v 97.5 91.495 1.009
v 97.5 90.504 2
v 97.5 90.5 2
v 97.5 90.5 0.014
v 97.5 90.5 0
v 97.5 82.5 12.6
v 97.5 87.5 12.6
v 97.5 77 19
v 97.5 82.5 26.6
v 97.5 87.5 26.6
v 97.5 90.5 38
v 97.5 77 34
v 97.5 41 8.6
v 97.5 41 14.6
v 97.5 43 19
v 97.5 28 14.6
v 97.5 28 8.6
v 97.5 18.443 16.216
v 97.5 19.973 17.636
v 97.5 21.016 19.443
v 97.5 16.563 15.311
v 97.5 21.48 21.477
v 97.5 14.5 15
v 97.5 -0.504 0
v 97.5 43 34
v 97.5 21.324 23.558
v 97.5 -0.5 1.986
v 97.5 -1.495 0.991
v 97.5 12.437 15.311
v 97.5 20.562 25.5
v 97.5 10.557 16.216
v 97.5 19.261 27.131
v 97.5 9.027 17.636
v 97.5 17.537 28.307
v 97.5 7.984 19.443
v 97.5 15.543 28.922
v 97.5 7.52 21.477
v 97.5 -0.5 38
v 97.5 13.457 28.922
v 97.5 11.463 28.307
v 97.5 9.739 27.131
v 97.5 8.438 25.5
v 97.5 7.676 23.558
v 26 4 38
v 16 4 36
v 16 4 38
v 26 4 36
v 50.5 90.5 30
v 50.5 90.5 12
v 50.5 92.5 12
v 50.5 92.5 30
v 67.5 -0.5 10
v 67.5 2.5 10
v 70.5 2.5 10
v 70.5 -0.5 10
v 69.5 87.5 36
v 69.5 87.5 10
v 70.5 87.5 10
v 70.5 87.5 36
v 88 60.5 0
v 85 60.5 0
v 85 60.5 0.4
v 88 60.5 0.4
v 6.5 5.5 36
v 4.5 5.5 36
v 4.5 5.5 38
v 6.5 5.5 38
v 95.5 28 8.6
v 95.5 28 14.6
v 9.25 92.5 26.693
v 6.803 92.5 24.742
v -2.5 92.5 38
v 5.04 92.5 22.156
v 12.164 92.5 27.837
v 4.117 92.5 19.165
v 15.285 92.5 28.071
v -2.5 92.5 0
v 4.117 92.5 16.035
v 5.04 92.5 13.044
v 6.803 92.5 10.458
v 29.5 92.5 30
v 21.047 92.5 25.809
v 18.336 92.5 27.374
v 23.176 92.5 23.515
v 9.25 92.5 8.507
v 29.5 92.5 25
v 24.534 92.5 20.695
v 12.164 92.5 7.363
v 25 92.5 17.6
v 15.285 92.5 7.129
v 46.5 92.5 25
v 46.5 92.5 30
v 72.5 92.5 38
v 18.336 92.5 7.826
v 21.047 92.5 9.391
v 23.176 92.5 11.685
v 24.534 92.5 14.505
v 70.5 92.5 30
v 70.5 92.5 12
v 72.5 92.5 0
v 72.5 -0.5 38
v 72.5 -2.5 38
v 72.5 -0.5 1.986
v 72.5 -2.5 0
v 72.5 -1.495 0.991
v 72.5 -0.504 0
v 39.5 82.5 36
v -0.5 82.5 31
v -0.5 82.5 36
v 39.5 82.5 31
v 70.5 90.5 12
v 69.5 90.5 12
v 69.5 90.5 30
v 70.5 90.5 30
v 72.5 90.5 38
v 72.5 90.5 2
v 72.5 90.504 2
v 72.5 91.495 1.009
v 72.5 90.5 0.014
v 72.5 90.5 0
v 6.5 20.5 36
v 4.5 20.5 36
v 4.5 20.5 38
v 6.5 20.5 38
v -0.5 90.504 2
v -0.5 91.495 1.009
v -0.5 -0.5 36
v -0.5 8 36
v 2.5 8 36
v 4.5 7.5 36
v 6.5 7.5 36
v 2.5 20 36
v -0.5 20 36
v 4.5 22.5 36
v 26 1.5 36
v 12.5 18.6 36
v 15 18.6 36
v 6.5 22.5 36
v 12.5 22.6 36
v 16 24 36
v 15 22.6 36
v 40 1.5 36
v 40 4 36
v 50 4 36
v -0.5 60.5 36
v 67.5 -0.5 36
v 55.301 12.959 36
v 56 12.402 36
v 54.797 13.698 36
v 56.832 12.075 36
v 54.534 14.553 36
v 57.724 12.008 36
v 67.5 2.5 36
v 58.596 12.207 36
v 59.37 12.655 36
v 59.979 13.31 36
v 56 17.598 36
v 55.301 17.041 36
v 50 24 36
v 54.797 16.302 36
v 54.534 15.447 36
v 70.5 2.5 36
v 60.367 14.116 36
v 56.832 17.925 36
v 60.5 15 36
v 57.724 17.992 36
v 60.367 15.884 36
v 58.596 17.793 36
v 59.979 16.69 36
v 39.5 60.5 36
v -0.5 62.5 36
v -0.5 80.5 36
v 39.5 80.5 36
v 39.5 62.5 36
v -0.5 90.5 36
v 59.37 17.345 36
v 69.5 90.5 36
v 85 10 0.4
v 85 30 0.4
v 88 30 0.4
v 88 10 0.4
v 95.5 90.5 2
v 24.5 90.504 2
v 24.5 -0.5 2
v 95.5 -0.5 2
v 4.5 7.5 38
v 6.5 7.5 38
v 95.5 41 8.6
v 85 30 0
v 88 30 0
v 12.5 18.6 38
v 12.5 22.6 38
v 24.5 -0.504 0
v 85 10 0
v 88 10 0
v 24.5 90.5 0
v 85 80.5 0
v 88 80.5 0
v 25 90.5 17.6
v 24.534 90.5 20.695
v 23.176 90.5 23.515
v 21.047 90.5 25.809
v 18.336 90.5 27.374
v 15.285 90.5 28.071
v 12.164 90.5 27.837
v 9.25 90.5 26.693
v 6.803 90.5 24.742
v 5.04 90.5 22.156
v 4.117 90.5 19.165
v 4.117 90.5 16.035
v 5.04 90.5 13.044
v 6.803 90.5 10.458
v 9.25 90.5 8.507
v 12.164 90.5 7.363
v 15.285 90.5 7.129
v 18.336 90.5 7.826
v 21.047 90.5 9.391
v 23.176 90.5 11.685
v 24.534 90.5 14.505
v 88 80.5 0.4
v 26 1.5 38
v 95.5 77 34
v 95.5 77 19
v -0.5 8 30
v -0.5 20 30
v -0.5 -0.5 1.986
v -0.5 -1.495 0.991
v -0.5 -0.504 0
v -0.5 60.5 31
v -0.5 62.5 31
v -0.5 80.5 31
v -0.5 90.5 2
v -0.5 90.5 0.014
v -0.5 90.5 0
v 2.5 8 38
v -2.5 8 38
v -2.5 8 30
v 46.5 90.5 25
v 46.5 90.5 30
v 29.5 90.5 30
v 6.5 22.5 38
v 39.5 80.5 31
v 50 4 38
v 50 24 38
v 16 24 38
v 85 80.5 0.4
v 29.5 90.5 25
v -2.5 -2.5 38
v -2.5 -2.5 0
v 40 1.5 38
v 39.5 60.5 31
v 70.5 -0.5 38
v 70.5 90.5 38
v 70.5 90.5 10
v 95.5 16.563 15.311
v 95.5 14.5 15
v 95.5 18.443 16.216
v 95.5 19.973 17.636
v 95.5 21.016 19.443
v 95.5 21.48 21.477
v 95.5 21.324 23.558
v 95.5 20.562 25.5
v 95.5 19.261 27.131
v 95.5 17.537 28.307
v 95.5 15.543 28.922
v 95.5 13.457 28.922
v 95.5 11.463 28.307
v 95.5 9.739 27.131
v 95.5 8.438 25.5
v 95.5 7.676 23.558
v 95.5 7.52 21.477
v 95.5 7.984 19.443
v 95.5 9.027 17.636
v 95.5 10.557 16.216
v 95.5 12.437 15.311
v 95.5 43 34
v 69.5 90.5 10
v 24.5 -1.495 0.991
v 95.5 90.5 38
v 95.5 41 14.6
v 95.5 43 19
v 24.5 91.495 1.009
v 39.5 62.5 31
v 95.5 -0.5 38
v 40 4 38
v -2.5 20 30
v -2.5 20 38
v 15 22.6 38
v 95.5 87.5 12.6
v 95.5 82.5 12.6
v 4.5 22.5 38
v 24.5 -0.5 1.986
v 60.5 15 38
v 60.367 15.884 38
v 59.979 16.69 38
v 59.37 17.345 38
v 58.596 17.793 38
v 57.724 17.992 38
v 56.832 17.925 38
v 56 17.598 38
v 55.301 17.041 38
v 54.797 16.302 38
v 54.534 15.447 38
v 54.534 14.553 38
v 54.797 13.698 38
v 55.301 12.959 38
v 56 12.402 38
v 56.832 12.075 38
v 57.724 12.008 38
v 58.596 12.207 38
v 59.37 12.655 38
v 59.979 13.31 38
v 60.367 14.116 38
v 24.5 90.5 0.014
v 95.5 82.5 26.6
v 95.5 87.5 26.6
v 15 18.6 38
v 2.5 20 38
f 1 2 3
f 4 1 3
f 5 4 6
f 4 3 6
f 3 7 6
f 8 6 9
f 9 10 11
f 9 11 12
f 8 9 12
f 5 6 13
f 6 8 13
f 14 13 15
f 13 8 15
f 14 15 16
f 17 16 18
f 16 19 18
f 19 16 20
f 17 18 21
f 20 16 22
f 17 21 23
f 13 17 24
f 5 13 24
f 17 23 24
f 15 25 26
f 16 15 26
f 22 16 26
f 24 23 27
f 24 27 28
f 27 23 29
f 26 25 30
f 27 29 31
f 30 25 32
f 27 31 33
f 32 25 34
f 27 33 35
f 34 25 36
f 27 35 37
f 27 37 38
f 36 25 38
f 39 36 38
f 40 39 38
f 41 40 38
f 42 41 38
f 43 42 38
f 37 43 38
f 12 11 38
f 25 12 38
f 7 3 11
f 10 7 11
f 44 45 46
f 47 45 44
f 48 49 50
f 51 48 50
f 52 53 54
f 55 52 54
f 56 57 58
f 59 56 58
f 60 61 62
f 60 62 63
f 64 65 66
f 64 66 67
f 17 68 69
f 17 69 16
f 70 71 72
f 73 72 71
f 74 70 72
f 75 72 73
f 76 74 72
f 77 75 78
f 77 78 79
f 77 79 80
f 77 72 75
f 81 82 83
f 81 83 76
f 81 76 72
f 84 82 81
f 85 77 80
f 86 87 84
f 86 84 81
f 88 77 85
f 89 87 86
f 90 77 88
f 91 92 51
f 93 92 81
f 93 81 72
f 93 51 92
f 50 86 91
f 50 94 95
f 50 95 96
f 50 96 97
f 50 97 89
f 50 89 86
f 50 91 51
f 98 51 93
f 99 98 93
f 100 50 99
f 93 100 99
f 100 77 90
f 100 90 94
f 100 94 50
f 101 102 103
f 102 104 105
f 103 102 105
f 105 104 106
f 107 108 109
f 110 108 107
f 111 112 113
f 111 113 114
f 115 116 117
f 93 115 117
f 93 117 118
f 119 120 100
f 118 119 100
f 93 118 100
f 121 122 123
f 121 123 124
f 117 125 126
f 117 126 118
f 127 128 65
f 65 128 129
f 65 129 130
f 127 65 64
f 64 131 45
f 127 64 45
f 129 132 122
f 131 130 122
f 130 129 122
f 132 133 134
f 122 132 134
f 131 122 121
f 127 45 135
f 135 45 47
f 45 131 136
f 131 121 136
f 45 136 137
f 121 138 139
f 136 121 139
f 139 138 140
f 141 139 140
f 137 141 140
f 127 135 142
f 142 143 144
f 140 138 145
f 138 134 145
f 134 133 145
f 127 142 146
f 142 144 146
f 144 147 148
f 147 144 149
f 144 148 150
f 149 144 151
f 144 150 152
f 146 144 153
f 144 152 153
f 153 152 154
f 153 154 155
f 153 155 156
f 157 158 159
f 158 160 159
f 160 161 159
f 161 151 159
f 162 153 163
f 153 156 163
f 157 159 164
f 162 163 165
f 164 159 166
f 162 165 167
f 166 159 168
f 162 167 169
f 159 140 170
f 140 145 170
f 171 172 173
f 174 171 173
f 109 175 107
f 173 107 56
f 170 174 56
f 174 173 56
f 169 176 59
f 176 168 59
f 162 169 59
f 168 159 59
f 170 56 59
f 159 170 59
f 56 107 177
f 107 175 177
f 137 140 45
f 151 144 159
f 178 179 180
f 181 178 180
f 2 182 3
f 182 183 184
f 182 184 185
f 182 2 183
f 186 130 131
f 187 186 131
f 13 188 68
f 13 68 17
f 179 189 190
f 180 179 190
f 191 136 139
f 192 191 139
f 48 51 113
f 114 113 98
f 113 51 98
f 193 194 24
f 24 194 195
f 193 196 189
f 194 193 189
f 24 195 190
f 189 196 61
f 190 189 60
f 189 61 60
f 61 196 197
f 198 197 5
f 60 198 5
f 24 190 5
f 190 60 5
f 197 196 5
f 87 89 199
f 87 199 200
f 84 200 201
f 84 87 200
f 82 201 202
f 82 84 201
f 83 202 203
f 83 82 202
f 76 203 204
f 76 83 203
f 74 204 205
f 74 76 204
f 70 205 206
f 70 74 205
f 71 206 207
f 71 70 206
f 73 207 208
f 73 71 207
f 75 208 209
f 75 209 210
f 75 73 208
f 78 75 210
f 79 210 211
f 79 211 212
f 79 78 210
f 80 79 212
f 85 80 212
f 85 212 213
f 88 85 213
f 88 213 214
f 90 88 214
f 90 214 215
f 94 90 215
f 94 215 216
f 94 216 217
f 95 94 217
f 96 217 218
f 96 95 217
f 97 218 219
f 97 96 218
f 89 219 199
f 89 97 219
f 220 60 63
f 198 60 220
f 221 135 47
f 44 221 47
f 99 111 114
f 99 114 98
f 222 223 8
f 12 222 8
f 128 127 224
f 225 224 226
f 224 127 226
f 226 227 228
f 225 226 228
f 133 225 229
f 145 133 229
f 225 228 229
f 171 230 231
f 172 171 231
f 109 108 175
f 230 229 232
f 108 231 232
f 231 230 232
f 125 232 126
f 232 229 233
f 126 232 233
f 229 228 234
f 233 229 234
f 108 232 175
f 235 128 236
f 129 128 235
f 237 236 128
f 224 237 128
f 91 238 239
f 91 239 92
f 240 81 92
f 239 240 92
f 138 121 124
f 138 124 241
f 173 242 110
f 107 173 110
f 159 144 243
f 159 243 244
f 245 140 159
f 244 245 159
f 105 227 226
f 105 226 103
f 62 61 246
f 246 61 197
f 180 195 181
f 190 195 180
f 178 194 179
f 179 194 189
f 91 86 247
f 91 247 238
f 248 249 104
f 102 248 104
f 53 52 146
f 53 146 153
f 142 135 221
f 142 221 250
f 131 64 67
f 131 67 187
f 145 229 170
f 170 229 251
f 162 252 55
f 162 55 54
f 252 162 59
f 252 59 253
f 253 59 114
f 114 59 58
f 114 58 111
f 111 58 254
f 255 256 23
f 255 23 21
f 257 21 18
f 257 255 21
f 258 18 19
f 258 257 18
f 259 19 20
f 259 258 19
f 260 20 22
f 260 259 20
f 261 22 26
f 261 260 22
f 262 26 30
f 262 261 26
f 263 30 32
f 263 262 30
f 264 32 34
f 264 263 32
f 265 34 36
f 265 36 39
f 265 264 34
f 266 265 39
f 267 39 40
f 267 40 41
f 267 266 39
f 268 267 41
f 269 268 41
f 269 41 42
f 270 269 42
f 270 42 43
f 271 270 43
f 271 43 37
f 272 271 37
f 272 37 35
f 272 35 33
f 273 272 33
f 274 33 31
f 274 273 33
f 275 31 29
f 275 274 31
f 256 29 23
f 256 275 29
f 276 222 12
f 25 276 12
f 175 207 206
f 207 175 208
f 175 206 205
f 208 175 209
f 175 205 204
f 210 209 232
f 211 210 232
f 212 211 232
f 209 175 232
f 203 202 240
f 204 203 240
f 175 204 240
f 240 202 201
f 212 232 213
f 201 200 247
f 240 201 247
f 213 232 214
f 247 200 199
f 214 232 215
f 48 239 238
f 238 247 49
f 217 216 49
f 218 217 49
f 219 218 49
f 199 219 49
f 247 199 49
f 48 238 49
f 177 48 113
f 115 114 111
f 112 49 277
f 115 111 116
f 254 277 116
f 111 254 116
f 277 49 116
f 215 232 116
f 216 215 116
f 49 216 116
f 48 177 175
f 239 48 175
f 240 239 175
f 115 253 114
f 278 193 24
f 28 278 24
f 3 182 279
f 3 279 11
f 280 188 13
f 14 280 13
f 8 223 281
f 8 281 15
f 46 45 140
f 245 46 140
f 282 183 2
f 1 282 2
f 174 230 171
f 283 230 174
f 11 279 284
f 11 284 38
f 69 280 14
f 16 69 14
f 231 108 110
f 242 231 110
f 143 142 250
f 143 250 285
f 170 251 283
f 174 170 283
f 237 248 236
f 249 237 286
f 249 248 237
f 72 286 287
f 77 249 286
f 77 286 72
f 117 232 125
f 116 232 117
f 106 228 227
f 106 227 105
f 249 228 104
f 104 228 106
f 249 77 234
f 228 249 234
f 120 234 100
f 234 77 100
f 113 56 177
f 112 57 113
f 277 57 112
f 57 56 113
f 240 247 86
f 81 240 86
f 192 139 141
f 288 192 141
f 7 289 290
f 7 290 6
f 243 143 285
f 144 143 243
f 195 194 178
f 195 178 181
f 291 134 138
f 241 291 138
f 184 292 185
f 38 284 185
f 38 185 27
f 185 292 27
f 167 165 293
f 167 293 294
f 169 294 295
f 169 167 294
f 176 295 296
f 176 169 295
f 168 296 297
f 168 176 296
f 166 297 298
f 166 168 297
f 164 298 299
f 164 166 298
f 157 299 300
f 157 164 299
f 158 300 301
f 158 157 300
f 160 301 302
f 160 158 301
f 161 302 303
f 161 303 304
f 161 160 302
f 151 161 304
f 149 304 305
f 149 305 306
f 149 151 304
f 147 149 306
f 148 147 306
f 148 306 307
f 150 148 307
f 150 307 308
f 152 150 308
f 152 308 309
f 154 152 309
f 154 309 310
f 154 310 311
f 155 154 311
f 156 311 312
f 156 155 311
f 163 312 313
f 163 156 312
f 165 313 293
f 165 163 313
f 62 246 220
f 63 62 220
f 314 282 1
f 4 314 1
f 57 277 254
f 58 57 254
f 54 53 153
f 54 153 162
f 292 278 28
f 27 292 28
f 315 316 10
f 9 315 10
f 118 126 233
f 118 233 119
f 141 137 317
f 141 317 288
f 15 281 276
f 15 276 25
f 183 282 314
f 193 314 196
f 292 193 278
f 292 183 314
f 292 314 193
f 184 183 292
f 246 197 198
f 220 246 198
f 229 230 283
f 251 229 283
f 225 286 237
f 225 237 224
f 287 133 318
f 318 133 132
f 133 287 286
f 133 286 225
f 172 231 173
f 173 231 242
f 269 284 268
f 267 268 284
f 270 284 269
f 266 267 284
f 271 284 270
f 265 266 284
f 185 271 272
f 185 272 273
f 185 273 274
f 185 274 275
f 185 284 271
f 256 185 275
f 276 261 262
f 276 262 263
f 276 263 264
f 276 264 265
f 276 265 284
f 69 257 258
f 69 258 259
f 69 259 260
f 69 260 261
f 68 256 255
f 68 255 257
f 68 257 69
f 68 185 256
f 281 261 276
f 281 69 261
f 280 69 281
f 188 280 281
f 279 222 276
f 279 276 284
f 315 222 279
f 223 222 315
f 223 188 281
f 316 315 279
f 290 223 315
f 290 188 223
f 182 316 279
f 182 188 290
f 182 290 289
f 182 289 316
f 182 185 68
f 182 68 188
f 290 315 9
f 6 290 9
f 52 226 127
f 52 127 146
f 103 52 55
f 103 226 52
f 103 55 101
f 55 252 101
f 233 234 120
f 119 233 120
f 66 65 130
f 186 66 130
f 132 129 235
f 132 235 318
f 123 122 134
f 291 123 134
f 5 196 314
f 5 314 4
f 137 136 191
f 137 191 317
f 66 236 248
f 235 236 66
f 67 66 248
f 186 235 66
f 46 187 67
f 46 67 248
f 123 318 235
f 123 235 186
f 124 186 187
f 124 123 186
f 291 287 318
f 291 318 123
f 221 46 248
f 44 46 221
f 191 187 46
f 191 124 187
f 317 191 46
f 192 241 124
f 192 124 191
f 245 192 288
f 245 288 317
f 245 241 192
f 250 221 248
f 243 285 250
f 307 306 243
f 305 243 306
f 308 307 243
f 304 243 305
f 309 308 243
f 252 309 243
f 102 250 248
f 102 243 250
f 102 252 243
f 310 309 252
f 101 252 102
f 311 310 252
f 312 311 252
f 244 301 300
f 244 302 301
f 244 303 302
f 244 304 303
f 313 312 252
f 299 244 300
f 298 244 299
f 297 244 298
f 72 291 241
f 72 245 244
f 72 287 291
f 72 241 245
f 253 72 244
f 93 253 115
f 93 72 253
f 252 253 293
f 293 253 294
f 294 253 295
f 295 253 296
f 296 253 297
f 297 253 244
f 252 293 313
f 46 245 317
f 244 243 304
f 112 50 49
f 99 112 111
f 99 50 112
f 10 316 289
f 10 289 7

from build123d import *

# Parameters (mm, degrees)
BOX020_W               = 73
BOX020_H               = 1
BOX020_DEPTH           = 2
BOX020_PLACEMENT_ANGLE = 45
BOX019_W               = 73
BOX019_H               = 1
BOX019_DEPTH           = 2
BOX019_PLACEMENT_ANGLE = 45
BOX018_W               = 73
BOX018_H               = 1
BOX018_DEPTH           = 2
CUT012_PLACEMENT_ANGLE = 180
BOX017_W               = 73
BOX017_H               = 91
BOX017_DEPTH           = 2
BOX015_W               = 3
BOX015_H               = 3
BOX015_DEPTH           = 26
BOX013_W               = 40
BOX013_H               = 2
BOX013_DEPTH           = 5
CYLINDER001_R          = 10.5
CYLINDER001_DEPTH      = 2
BOX012_W               = 17
BOX012_H               = 2
BOX012_DEPTH           = 5
BOX011_W               = 20
BOX011_H               = 2
BOX011_DEPTH           = 18
BOX010_W               = 75
BOX010_H               = 2
BOX010_DEPTH           = 38
BOX009_W               = 75
BOX009_H               = 2
BOX009_DEPTH           = 38
BOX008_W               = 2
BOX008_H               = 12
BOX008_DEPTH           = 8
BOX007_W               = 2
BOX007_H               = 91
BOX007_DEPTH           = 38
BOX006_W               = 3
BOX006_H               = 12
BOX006_DEPTH           = 2
BOX005_W               = 2
BOX005_H               = 2
BOX005_DEPTH           = 2
BOX004_W               = 2
BOX004_H               = 2
BOX004_DEPTH           = 2
BOX003_W               = 2.5
BOX003_H               = 4
BOX003_DEPTH           = 2
CYLINDER_R             = 3
CYLINDER_DEPTH         = 2
BOX002_W               = 14
BOX002_H               = 5
BOX002_DEPTH           = 2
BOX001_W               = 34
BOX001_H               = 20
BOX001_DEPTH           = 2
BOX_W                  = 71
BOX_H                  = 91
BOX_DEPTH              = 2
BOX014_W               = 40
BOX014_H               = 2
BOX014_DEPTH           = 5
BOX016_W               = 1
BOX016_H               = 3
BOX016_DEPTH           = 26
BOX026_W               = 2
BOX026_H               = 5
BOX026_DEPTH           = 14
BOX024_W               = 2
BOX024_H               = 13
BOX024_DEPTH           = 6
BOX025_W               = 2
BOX025_H               = 34
BOX025_DEPTH           = 15
CYLINDER002_R          = 7
CYLINDER002_DEPTH      = 2
BOX023_W               = 3
BOX023_H               = 20
BOX023_DEPTH           = 0.4
BOX022_W               = 3
BOX022_H               = 20
BOX022_DEPTH           = 0.4
BOX021_W               = 2
BOX021_H               = 91
BOX021_DEPTH           = 38


with BuildPart() as cube005:
    # Box020 → Box020 (new body)
    with BuildSketch(Plane.XY):
        with Locations((36.5, 0.5)):
            Rectangle(BOX020_W, BOX020_H)
    extrude(amount=BOX020_DEPTH)


with BuildPart() as cube005_1:
    # Box020 placement: moved
    add(cube005.part.moved(Location((0, -9.668, -0.75))).rotate(Axis((0, -9.668, -0.75), (1, 0, 0)), BOX020_PLACEMENT_ANGLE))


with BuildPart() as cube004:
    # Box019 → Box019 (new body)
    with BuildSketch(Plane.XY):
        with Locations((36.5, 0.5)):
            Rectangle(BOX019_W, BOX019_H)
    extrude(amount=BOX019_DEPTH)


with BuildPart() as cube004_1:
    # Box019 placement: moved
    add(cube004.part.moved(Location((0, -10.9, 1.5))).rotate(Axis((0, -10.9, 1.5), (-1, 0, 0)), BOX019_PLACEMENT_ANGLE))


with BuildPart() as cut011:
    # Box018 → Box018 (new body)
    with BuildSketch(Plane(origin=(0, -10, 0), x_dir=(1, 0, 0), z_dir=(0, 0, 1))):
        with Locations((36.5, 0.5)):
            Rectangle(BOX018_W, BOX018_H)
    extrude(amount=BOX018_DEPTH)

    # Cut011: cut Cube004
    add(cube004_1.part, mode=Mode.SUBTRACT)


with BuildPart() as groove_back:
    # Cut012 base: copy of Cut011
    add(cut011.part)

    # Cut012: cut Cube005
    add(cube005_1.part, mode=Mode.SUBTRACT)


with BuildPart() as groove_back_1:
    # Cut012 placement: moved
    add(groove_back.part.moved(Location((-0.5, 81.5, -8))).rotate(Axis((-0.5, 81.5, -8), (1, 0, 0)), CUT012_PLACEMENT_ANGLE))


with BuildPart() as groove_front:
    # Cut013 base: copy of Cut011
    add(cut011.part)

    # Cut013: cut Cube005
    add(cube005_1.part, mode=Mode.SUBTRACT)


with BuildPart() as groove_front_1:
    # Cut013 placement: moved
    add(groove_front.part.moved(Location((-0.5, 8.5, -10))))


with BuildPart() as fusion007:
    # Box017 → Box017 (new body)
    with BuildSketch(Plane(origin=(-0.5, -0.5, -10), x_dir=(1, 0, 0), z_dir=(0, 0, 1))):
        with Locations((36.5, 45.5)):
            Rectangle(BOX017_W, BOX017_H)
    extrude(amount=BOX017_DEPTH)

    # Fusion007: union Groove front
    add(groove_front_1.part)


with BuildPart() as baseplate_groove_cutout:
    # Fusion009 base: copy of Fusion007
    add(fusion007.part)

    # Fusion009: union Groove back
    add(groove_back_1.part)


with BuildPart() as baseplate_groove_cutout_1:
    # Fusion009 placement: moved
    add(baseplate_groove_cutout.part.moved(Location((0, 0, 10))))


with BuildPart() as box015:
    # Box015 → Box015 (new body)
    with BuildSketch(Plane(origin=(67.5, -0.5, 10), x_dir=(1, 0, 0), z_dir=(0, 0, 1))):
        with Locations((1.5, 1.5)):
            Rectangle(BOX015_W, BOX015_H)
    extrude(amount=BOX015_DEPTH)


with BuildPart() as box013:
    # Box013 → Box013 (new body)
    with BuildSketch(Plane(origin=(-0.5, 80.5, 31), x_dir=(1, 0, 0), z_dir=(0, 0, 1))):
        with Locations((20, 1)):
            Rectangle(BOX013_W, BOX013_H)
    extrude(amount=BOX013_DEPTH)


with BuildPart() as cylinder001:
    # Cylinder001 → Cylinder001 (new body)
    with BuildSketch(Plane(origin=(14.5, 92.5, 17.6), x_dir=(1, 0, 0), z_dir=(0, -1, 0))):
        Circle(CYLINDER001_R)
    extrude(amount=CYLINDER001_DEPTH)


with BuildPart() as box012:
    # Box012 → Box012 (new body)
    with BuildSketch(Plane(origin=(29.5, 90.5, 25), x_dir=(1, 0, 0), z_dir=(0, 0, 1))):
        with Locations((8.5, 1)):
            Rectangle(BOX012_W, BOX012_H)
    extrude(amount=BOX012_DEPTH)


with BuildPart() as dht_cutout:
    # Box011 → Box011 (new body)
    with BuildSketch(Plane(origin=(50.5, 90.5, 12), x_dir=(1, 0, 0), z_dir=(0, 0, 1))):
        with Locations((10, 1)):
            Rectangle(BOX011_W, BOX011_H)
    extrude(amount=BOX011_DEPTH)


with BuildPart() as cut010:
    # Box010 → Box010 (new body)
    with BuildSketch(Plane(origin=(-2.5, 90.5, 0), x_dir=(1, 0, 0), z_dir=(0, 0, 1))):
        with Locations((37.5, 1)):
            Rectangle(BOX010_W, BOX010_H)
    extrude(amount=BOX010_DEPTH)

    # Cut008: cut DHT cutout
    add(dht_cutout.part, mode=Mode.SUBTRACT)

    # Cut009: cut Box012
    add(box012.part, mode=Mode.SUBTRACT)

    # Cut010: cut Cylinder001
    add(cylinder001.part, mode=Mode.SUBTRACT)


with BuildPart() as front_side:
    # Box009 → Box009 (new body)
    with BuildSketch(Plane(origin=(-2.5, -2.5, 0), x_dir=(1, 0, 0), z_dir=(0, 0, 1))):
        with Locations((37.5, 1)):
            Rectangle(BOX009_W, BOX009_H)
    extrude(amount=BOX009_DEPTH)


with BuildPart() as usb_cutout_left:
    # Box008 → Box008 (new body)
    with BuildSketch(Plane(origin=(-2.5, 8, 30), x_dir=(1, 0, 0), z_dir=(0, 0, 1))):
        with Locations((1, 6)):
            Rectangle(BOX008_W, BOX008_H)
    extrude(amount=BOX008_DEPTH)


with BuildPart() as cut007:
    # Box007 → Box007 (new body)
    with BuildSketch(Plane(origin=(-2.5, -0.5, 0), x_dir=(1, 0, 0), z_dir=(0, 0, 1))):
        with Locations((1, 45.5)):
            Rectangle(BOX007_W, BOX007_H)
    extrude(amount=BOX007_DEPTH)

    # Cut007: cut USB cutout left
    add(usb_cutout_left.part, mode=Mode.SUBTRACT)


with BuildPart() as usb_cutout_top:
    # Box006 → Box006 (new body)
    with BuildSketch(Plane(origin=(-0.5, 8, 0), x_dir=(1, 0, 0), z_dir=(0, 0, 1))):
        with Locations((1.5, 6)):
            Rectangle(BOX006_W, BOX006_H)
    extrude(amount=BOX006_DEPTH)


with BuildPart() as rst:
    # Box005 → Box005 (new body)
    with BuildSketch(Plane(origin=(4.5, 5.5, 0), x_dir=(1, 0, 0), z_dir=(0, 0, 1))):
        with Locations((1, 1)):
            Rectangle(BOX005_W, BOX005_H)
    extrude(amount=BOX005_DEPTH)


with BuildPart() as prg:
    # Box004 → Box004 (new body)
    with BuildSketch(Plane(origin=(4.5, 20.5, 0), x_dir=(1, 0, 0), z_dir=(0, 0, 1))):
        with Locations((1, 1)):
            Rectangle(BOX004_W, BOX004_H)
    extrude(amount=BOX004_DEPTH)


with BuildPart() as led_cutout:
    # Box003 → Box003 (new body)
    with BuildSketch(Plane(origin=(12.5, 18.6, 0), x_dir=(1, 0, 0), z_dir=(0, 0, 1))):
        with Locations((1.25, 2)):
            Rectangle(BOX003_W, BOX003_H)
    extrude(amount=BOX003_DEPTH)


with BuildPart() as rgb_led_cutout:
    # Cylinder → Cylinder (new body)
    with BuildSketch(Plane(origin=(57.5, 15, 0), x_dir=(1, 0, 0), z_dir=(0, 0, 1))):
        Circle(CYLINDER_R)
    extrude(amount=CYLINDER_DEPTH)


with BuildPart() as cube002:
    # Box002 → Box002 (new body)
    with BuildSketch(Plane(origin=(26, 1.5, 0), x_dir=(1, 0, 0), z_dir=(0, 0, 1))):
        with Locations((7, 2.5)):
            Rectangle(BOX002_W, BOX002_H)
    extrude(amount=BOX002_DEPTH)


with BuildPart() as cube001:
    # Box001 → Box001 (new body)
    with BuildSketch(Plane(origin=(16, 4, 0), x_dir=(1, 0, 0), z_dir=(0, 0, 1))):
        with Locations((17, 10)):
            Rectangle(BOX001_W, BOX001_H)
    extrude(amount=BOX001_DEPTH)


with BuildPart() as fusion003:
    # Box → Box (new body)
    with BuildSketch(Plane(origin=(-0.5, -0.5, 0), x_dir=(1, 0, 0), z_dir=(0, 0, 1))):
        with Locations((35.5, 45.5)):
            Rectangle(BOX_W, BOX_H)
    extrude(amount=BOX_DEPTH)

    # Cut: cut Cube001
    add(cube001.part, mode=Mode.SUBTRACT)

    # Cut001: cut Cube002
    add(cube002.part, mode=Mode.SUBTRACT)

    # Cut002: cut RGB LED cutout
    add(rgb_led_cutout.part, mode=Mode.SUBTRACT)

    # Cut003: cut LED cutout
    add(led_cutout.part, mode=Mode.SUBTRACT)

    # Cut004: cut PRG
    add(prg.part, mode=Mode.SUBTRACT)

    # Cut005: cut RST
    add(rst.part, mode=Mode.SUBTRACT)

    # Cut006: cut USB cutout top
    add(usb_cutout_top.part, mode=Mode.SUBTRACT)


with BuildPart() as fusion003_1:
    # Cut006 placement: moved
    add(fusion003.part.moved(Location((0, 0, 36))))

    # Fusion: union Cut007
    add(cut007.part)

    # Fusion001: union Front side
    add(front_side.part)

    # Fusion002: union Cut010
    add(cut010.part)

    # Fusion003: union Box013
    add(box013.part)


with BuildPart() as fusion005:
    # Box014 → Box014 (new body)
    with BuildSketch(Plane(origin=(-0.5, 60.5, 31), x_dir=(1, 0, 0), z_dir=(0, 0, 1))):
        with Locations((20, 1)):
            Rectangle(BOX014_W, BOX014_H)
    extrude(amount=BOX014_DEPTH)

    # Fusion004: union Fusion003
    add(fusion003_1.part)

    # Fusion005: union Box015
    add(box015.part)


with BuildPart() as top_case:
    # Box016 → Box016 (new body)
    with BuildSketch(Plane(origin=(69.5, 87.5, 10), x_dir=(1, 0, 0), z_dir=(0, 0, 1))):
        with Locations((0.5, 1.5)):
            Rectangle(BOX016_W, BOX016_H)
    extrude(amount=BOX016_DEPTH)

    # Fusion006: union Fusion005
    add(fusion005.part)

    # Cut014: cut Baseplate groove cutout
    add(baseplate_groove_cutout_1.part, mode=Mode.SUBTRACT)


with BuildPart() as dht_side_cutout:
    # Box026 → Box026 (new body)
    with BuildSketch(Plane(origin=(95.5, 82.5, 12.6), x_dir=(1, 0, 0), z_dir=(0, 0, 1))):
        with Locations((1, 2.5)):
            Rectangle(BOX026_W, BOX026_H)
    extrude(amount=BOX026_DEPTH)


with BuildPart() as power_switch_cutout:
    # Box024 → Box024 (new body)
    with BuildSketch(Plane(origin=(95.5, 28, 8.6), x_dir=(1, 0, 0), z_dir=(0, 0, 1))):
        with Locations((1, 6.5)):
            Rectangle(BOX024_W, BOX024_H)
    extrude(amount=BOX024_DEPTH)


with BuildPart() as co2_sensor_cutout001:
    # Box025 → Box025 (new body)
    with BuildSketch(Plane(origin=(95.5, 43, 19), x_dir=(1, 0, 0), z_dir=(0, 0, 1))):
        with Locations((1, 17)):
            Rectangle(BOX025_W, BOX025_H)
    extrude(amount=BOX025_DEPTH)


with BuildPart() as buzzer_cutout:
    # Cylinder002 → Cylinder002 (new body)
    with BuildSketch(Plane(origin=(95.5, 14.5, 22), x_dir=(0, 0, -1), z_dir=(1, 0, 0))):
        Circle(CYLINDER002_R)
    extrude(amount=CYLINDER002_DEPTH)


with BuildPart() as box023:
    # Box023 → Box023 (new body)
    with BuildSketch(Plane(origin=(85, 60.5, 0), x_dir=(1, 0, 0), z_dir=(0, 0, 1))):
        with Locations((1.5, 10)):
            Rectangle(BOX023_W, BOX023_H)
    extrude(amount=BOX023_DEPTH)


with BuildPart() as box022:
    # Box022 → Box022 (new body)
    with BuildSketch(Plane(origin=(85, 10, 0), x_dir=(1, 0, 0), z_dir=(0, 0, 1))):
        with Locations((1.5, 10)):
            Rectangle(BOX022_W, BOX022_H)
    extrude(amount=BOX022_DEPTH)


with BuildPart() as right_side:
    # Box021 → Box021 (new body)
    with BuildSketch(Plane(origin=(70.5, -0.5, 0), x_dir=(1, 0, 0), z_dir=(0, 0, 1))):
        with Locations((1, 45.5)):
            Rectangle(BOX021_W, BOX021_H)
    extrude(amount=BOX021_DEPTH)


with BuildPart() as bottom_case:
    # Fusion008 base: copy of Fusion007
    add(fusion007.part)

    # Fusion008: union Groove back
    add(groove_back_1.part)


with BuildPart() as bottom_case_1:
    # Fusion008 placement: moved
    add(bottom_case.part.moved(Location((0, 0, 10))))

    # Fusion010: union Right side
    add(right_side.part)


with BuildPart() as bottom_case_2:
    # Fusion010 placement: moved
    add(bottom_case_1.part.moved(Location((25, 0, 0))))

    # Cut015: cut Box022
    add(box022.part, mode=Mode.SUBTRACT)

    # Cut016: cut Box023
    add(box023.part, mode=Mode.SUBTRACT)

    # Cut017: cut Buzzer cutout
    add(buzzer_cutout.part, mode=Mode.SUBTRACT)

    # Cut018: cut CO2 sensor cutout001
    add(co2_sensor_cutout001.part, mode=Mode.SUBTRACT)

    # Cut019: cut Power switch cutout
    add(power_switch_cutout.part, mode=Mode.SUBTRACT)

    # Cut020: cut DHT side cutout
    add(dht_side_cutout.part, mode=Mode.SUBTRACT)


solid = Compound([top_case.part, bottom_case_2.part])
